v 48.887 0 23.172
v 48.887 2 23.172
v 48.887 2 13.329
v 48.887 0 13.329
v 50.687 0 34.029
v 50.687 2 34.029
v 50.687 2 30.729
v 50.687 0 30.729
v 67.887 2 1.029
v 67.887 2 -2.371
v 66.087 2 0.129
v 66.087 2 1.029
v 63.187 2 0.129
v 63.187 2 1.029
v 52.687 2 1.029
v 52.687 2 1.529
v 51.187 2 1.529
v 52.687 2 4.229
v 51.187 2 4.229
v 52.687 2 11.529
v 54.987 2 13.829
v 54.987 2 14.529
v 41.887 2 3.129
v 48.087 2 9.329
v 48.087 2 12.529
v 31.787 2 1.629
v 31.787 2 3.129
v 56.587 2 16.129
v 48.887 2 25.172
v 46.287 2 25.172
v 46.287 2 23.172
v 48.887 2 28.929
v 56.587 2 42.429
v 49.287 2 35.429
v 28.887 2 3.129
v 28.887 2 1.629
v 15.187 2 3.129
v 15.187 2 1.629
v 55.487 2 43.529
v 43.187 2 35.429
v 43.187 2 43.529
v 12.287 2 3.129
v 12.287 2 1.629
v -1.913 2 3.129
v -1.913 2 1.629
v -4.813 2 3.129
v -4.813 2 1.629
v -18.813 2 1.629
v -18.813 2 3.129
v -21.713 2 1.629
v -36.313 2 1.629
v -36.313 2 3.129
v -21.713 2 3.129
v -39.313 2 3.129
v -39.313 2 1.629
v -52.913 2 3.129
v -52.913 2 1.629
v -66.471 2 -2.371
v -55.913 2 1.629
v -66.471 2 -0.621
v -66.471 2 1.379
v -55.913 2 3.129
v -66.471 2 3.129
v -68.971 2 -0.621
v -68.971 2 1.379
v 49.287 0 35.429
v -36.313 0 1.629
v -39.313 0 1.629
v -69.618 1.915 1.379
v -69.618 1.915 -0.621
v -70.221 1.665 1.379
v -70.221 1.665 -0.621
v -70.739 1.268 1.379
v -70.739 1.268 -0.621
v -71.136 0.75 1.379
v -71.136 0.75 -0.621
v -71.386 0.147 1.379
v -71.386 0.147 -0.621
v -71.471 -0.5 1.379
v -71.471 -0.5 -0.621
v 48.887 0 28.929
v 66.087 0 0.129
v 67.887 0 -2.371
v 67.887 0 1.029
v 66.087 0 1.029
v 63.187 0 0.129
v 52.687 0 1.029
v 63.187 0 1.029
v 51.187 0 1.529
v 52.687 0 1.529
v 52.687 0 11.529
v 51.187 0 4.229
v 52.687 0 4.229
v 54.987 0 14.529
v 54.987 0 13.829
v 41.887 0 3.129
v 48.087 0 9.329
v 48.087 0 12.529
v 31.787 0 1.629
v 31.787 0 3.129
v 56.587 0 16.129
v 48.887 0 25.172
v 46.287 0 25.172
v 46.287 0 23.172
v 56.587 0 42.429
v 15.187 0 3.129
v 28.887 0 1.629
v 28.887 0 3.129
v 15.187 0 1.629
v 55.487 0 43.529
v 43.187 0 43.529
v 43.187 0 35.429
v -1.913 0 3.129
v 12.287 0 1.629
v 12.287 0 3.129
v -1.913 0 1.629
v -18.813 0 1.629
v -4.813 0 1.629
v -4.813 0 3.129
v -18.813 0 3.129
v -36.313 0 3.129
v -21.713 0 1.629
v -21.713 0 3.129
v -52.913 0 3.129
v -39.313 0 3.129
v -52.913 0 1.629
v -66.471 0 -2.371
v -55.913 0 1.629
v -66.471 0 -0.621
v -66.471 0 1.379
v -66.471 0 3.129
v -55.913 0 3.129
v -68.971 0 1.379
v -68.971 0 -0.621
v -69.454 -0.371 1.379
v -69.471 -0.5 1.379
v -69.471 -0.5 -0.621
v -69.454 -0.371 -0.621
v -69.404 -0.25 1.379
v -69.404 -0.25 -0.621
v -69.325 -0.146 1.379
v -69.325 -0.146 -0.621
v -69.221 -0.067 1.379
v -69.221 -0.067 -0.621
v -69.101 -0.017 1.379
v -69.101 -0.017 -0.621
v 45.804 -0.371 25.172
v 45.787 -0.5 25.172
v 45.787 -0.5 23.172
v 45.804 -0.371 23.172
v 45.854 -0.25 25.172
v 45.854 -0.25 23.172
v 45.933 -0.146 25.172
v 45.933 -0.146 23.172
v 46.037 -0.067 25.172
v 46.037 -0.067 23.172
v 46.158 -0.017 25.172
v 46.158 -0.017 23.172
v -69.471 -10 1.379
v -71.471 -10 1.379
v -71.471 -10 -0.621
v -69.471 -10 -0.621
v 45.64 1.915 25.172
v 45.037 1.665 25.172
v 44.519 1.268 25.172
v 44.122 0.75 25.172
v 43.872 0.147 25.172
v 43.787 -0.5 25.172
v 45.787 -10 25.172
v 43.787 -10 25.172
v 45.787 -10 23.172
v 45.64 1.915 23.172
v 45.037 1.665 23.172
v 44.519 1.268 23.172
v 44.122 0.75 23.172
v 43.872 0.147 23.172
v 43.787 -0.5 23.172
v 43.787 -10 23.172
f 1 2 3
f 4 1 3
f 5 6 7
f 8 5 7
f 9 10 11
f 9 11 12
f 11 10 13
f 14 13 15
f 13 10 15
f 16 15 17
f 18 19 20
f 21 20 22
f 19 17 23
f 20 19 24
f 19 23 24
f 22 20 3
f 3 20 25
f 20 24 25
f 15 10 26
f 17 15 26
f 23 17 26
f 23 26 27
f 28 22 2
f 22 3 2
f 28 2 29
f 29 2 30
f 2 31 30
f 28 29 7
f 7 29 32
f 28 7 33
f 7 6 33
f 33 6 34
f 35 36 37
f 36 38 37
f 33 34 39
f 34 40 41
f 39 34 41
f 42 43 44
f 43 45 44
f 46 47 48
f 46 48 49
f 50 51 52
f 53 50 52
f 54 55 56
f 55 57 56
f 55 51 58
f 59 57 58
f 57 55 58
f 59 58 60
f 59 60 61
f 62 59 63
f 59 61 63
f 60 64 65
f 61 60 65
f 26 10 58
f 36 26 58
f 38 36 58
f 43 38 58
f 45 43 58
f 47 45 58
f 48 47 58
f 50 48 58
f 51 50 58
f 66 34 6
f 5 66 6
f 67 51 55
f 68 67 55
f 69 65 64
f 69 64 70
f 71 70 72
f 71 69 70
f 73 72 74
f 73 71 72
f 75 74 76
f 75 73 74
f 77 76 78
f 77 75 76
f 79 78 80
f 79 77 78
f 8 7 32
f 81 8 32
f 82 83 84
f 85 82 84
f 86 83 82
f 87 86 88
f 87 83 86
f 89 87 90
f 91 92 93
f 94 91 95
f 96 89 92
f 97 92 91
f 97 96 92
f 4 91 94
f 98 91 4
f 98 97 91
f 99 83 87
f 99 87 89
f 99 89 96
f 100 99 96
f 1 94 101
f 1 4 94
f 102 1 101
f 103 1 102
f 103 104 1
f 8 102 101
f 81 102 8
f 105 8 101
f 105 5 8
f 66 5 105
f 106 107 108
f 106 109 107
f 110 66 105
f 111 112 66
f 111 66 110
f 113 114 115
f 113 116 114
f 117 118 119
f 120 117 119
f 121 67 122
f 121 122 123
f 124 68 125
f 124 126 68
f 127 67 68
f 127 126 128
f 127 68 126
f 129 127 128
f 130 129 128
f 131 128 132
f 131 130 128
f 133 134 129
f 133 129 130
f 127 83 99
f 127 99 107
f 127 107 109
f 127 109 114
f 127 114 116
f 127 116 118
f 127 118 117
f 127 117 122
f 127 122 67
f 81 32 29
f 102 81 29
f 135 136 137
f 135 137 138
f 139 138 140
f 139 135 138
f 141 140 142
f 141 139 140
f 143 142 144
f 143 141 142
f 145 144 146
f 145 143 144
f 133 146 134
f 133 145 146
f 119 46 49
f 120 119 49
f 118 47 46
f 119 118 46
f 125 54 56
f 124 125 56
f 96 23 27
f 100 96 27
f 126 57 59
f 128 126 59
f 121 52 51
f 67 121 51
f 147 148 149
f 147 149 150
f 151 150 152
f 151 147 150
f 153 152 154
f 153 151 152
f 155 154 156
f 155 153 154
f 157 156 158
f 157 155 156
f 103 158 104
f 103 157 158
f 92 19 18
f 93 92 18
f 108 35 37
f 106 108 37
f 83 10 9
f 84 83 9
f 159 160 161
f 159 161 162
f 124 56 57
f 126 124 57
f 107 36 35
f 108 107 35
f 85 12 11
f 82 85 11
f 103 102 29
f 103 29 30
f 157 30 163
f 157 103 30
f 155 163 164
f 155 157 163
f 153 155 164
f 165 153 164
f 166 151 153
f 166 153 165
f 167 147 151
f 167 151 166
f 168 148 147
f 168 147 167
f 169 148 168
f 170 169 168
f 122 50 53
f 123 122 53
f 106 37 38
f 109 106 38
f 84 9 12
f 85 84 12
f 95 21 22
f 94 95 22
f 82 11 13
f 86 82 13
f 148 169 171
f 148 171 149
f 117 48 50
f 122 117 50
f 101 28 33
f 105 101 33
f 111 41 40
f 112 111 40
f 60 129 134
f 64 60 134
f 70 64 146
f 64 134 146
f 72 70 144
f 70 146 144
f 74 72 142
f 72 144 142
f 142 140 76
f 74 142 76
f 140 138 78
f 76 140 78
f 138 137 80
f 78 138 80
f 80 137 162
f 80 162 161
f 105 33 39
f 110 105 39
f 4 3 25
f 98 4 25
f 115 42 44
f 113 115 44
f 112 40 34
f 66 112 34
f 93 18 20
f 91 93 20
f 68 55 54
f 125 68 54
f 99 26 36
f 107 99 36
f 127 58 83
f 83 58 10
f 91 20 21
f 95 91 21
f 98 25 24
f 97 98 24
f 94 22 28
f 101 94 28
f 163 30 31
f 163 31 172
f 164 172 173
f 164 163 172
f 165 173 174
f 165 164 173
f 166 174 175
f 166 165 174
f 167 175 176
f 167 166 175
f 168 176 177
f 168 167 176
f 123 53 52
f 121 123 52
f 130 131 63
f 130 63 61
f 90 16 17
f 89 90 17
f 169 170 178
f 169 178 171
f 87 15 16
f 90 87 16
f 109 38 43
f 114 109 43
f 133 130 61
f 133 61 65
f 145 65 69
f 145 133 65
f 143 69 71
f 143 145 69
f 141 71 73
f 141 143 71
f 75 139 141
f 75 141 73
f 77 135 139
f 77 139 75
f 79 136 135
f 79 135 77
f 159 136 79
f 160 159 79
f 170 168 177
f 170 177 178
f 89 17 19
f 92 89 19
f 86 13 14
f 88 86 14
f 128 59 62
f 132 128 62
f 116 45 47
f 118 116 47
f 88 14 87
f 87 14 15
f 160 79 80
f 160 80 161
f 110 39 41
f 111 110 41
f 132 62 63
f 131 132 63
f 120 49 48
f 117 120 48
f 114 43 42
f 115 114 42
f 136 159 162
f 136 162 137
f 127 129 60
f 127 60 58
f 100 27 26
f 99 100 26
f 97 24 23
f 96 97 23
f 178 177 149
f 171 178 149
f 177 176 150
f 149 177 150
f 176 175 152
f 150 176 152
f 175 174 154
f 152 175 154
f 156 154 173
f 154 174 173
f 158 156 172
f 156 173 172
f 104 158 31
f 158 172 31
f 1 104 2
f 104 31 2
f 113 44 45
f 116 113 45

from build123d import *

# Parameters (mm, degrees)
BOSS_EXTRUDE1_DEPTH     = 2
EDGE_FLANGE1_DEPTH      = 2
EDGE_FLANGE1_BEND_DEPTH = 2
MOVE_FACE1_BY           = 5
CUT_EXTRUDE1_DEPTH      = 10


# Sheet-metal steps are written as plain solids
with BuildPart() as part:
    # Sketch1 → Boss-Extrude1 (new body)
    with BuildSketch(Plane(origin=(0, 0, 0), x_dir=(1, 0, 0), z_dir=(0, 1, 0))):
        Polygon((48.786990623, -23.171897133), (48.786990623, -13.328634875), (47.986992223, -12.528636475), (47.986992223, -9.428635055), (41.786991923, -3.228634755), (-54.913007717, -3.228634755), (-66.471417942, -3.228634755), (-66.471417942, -1.378635375), (-68.471417942, -1.378635375), (-68.471417942, 0.621364625), (-66.471417942, 0.621364625), (-66.471417942, 2.471364005), (-54.913007717, 2.471364005), (65.786992183, 2.471364005), (65.786992183, -1.128636415), (52.786992783, -1.128636415), (52.786992783, -11.528635935), (54.986990923, -13.728634075), (54.986993463, -14.428635215), (56.686992603, -16.128634355), (56.686992603, -42.528634895), (53.786993323, -45.428634175), (43.086991863, -45.428634175), (43.086991863, -34.028634115), (49.286992163, -34.028634115), (50.586992103, -32.728634175), (50.586992103, -30.828635435), (48.786990623, -29.028636495), (48.786990623, -25.171897133), (46.786990623, -25.171897133), (46.786990623, -23.171897133), align=None)
    extrude(amount=BOSS_EXTRUDE1_DEPTH)

    # Edge-Flange1 section (across the edge) → Edge-Flange1 (add)
    with BuildSketch(Plane(origin=(-69.471417942, 0, 1.378635375), x_dir=(1, 0, 0), z_dir=(0, 0, -1))):
        with BuildLine():
            Line((-2, 0.5), (-2, 10))
            Line((-2, 10), (0, 10))
            Line((0, 10), (0, 0.5))
            ThreePointArc((0, 0.5), (0.146446609, 0.146446609), (0.5, 0))
            Line((0.5, 0), (1, 0))
            Line((1, 0), (1, -2))
            Line((1, -2), (0.5, -2))
            ThreePointArc((0.5, -2), (-1.267766953, -1.267766953), (-2, 0.5))
        make_face()
    extrude(amount=EDGE_FLANGE1_DEPTH)

    # Edge-Flange1 section 2 (across the edge) → Edge-Flange1 bend (add)
    with BuildSketch(Plane(origin=(45.786990623, 0, 25.171897133), x_dir=(1, 0, 0), z_dir=(0, 0, -1))):
        with BuildLine():
            Line((-2, 0.5), (-2, 10))
            Line((-2, 10), (0, 10))
            Line((0, 10), (0, 0.5))
            ThreePointArc((0, 0.5), (0.146446609, 0.146446609), (0.5, 0))
            Line((0.5, 0), (1, 0))
            Line((1, 0), (1, -2))
            Line((1, -2), (0.5, -2))
            ThreePointArc((0.5, -2), (-1.267766953, -1.267766953), (-2, 0.5))
        make_face()
    extrude(amount=EDGE_FLANGE1_BEND_DEPTH)

    # Move Face1: a face moved outward by 5.0
    extrude(part.faces().sort_by_distance((65.786992183, 1, -0.671363795))[0], amount=MOVE_FACE1_BY, dir=(1, 0, 0))

    # Sketch12 → Cut-Extrude1 (cut)
    with BuildSketch(Plane(origin=(0, 2, 0), x_dir=(1, 0, 0), z_dir=(0, 1, 0))):
        Polygon((-52.913012042, -1.628639718), (-55.913012042, -1.628639718), (-55.913012042, -3.128639258), (-67.564249917, -3.128639258), (-67.671952829, -4.327104706), (41.886988858, -5.326407077), (48.086989158, -13.828640718), (48.007739716, -22.517187069), (46.286990623, -23.171897133), (48.886987558, -23.171897133), (48.886987558, -13.328639178), (48.086989158, -12.528640778), (48.086989158, -9.328639558), (41.886988858, -3.128639258), (31.786988738, -3.128639258), (31.786988738, -1.628639718), (28.886989458, -1.628639718), (28.886989458, -3.128639258), (15.186988918, -3.128639258), (15.186988918, -1.628639718), (12.286989638, -1.628639718), (12.286989638, -3.128639258), (-1.913012442, -3.128639258), (-1.913012442, -1.628639718), (-4.813011722, -1.628639718), (-4.813011722, -3.128639258), (-18.813011662, -3.128639258), (-18.813011662, -1.628639718), (-21.713010942, -1.628639718), (-21.713010942, -3.128639258), (-36.313012222, -3.128639258), (-36.313012222, -1.628639718), (-39.313011302, -1.628639718), (-39.313011302, -3.128639258), (-52.913012042, -3.128639258), align=None)
        Polygon((48.886987558, -25.171897133), (46.286990623, -25.171897133), (41.570815933, -34.028638418), (41.570815933, -47.167587605), (56.254650903, -46.954291818), (57.278434149, -42.02008581), (58.126913923, -16.761088184), (54.30540669, -8.580570975), (54.30540669, -2.3223377), (71.613193797, -2.589733287), (71.946410025, 3.760976012), (44.354427072, 3.760976012), (-68.474759816, 3.760976012), (-68.386329283, 2.371359902), (67.886988718, 2.371359902), (67.886988718, -1.028638378), (66.086988718, -1.028638378), (66.086988718, -0.128640178), (63.186989438, -0.128640178), (63.186989438, -1.028638378), (52.686987578, -1.028638378), (52.686987578, -1.528639918), (51.186988038, -1.528639918), (51.186988038, -4.228639598), (52.686987578, -4.228639598), (52.686987578, -11.528640238), (54.986988058, -13.828640718), (54.986988058, -14.528639318), (56.586989938, -16.128641198), (56.586989938, -42.428636858), (55.486987058, -43.528639738), (43.186988798, -43.528639738), (43.186988798, -35.428640698), (49.286986758, -35.428640698), (50.686989038, -34.028638418), (50.686989038, -30.728637398), (48.886987558, -28.928638458), align=None)
    extrude(amount=-CUT_EXTRUDE1_DEPTH, mode=Mode.SUBTRACT)


solid = part.part
